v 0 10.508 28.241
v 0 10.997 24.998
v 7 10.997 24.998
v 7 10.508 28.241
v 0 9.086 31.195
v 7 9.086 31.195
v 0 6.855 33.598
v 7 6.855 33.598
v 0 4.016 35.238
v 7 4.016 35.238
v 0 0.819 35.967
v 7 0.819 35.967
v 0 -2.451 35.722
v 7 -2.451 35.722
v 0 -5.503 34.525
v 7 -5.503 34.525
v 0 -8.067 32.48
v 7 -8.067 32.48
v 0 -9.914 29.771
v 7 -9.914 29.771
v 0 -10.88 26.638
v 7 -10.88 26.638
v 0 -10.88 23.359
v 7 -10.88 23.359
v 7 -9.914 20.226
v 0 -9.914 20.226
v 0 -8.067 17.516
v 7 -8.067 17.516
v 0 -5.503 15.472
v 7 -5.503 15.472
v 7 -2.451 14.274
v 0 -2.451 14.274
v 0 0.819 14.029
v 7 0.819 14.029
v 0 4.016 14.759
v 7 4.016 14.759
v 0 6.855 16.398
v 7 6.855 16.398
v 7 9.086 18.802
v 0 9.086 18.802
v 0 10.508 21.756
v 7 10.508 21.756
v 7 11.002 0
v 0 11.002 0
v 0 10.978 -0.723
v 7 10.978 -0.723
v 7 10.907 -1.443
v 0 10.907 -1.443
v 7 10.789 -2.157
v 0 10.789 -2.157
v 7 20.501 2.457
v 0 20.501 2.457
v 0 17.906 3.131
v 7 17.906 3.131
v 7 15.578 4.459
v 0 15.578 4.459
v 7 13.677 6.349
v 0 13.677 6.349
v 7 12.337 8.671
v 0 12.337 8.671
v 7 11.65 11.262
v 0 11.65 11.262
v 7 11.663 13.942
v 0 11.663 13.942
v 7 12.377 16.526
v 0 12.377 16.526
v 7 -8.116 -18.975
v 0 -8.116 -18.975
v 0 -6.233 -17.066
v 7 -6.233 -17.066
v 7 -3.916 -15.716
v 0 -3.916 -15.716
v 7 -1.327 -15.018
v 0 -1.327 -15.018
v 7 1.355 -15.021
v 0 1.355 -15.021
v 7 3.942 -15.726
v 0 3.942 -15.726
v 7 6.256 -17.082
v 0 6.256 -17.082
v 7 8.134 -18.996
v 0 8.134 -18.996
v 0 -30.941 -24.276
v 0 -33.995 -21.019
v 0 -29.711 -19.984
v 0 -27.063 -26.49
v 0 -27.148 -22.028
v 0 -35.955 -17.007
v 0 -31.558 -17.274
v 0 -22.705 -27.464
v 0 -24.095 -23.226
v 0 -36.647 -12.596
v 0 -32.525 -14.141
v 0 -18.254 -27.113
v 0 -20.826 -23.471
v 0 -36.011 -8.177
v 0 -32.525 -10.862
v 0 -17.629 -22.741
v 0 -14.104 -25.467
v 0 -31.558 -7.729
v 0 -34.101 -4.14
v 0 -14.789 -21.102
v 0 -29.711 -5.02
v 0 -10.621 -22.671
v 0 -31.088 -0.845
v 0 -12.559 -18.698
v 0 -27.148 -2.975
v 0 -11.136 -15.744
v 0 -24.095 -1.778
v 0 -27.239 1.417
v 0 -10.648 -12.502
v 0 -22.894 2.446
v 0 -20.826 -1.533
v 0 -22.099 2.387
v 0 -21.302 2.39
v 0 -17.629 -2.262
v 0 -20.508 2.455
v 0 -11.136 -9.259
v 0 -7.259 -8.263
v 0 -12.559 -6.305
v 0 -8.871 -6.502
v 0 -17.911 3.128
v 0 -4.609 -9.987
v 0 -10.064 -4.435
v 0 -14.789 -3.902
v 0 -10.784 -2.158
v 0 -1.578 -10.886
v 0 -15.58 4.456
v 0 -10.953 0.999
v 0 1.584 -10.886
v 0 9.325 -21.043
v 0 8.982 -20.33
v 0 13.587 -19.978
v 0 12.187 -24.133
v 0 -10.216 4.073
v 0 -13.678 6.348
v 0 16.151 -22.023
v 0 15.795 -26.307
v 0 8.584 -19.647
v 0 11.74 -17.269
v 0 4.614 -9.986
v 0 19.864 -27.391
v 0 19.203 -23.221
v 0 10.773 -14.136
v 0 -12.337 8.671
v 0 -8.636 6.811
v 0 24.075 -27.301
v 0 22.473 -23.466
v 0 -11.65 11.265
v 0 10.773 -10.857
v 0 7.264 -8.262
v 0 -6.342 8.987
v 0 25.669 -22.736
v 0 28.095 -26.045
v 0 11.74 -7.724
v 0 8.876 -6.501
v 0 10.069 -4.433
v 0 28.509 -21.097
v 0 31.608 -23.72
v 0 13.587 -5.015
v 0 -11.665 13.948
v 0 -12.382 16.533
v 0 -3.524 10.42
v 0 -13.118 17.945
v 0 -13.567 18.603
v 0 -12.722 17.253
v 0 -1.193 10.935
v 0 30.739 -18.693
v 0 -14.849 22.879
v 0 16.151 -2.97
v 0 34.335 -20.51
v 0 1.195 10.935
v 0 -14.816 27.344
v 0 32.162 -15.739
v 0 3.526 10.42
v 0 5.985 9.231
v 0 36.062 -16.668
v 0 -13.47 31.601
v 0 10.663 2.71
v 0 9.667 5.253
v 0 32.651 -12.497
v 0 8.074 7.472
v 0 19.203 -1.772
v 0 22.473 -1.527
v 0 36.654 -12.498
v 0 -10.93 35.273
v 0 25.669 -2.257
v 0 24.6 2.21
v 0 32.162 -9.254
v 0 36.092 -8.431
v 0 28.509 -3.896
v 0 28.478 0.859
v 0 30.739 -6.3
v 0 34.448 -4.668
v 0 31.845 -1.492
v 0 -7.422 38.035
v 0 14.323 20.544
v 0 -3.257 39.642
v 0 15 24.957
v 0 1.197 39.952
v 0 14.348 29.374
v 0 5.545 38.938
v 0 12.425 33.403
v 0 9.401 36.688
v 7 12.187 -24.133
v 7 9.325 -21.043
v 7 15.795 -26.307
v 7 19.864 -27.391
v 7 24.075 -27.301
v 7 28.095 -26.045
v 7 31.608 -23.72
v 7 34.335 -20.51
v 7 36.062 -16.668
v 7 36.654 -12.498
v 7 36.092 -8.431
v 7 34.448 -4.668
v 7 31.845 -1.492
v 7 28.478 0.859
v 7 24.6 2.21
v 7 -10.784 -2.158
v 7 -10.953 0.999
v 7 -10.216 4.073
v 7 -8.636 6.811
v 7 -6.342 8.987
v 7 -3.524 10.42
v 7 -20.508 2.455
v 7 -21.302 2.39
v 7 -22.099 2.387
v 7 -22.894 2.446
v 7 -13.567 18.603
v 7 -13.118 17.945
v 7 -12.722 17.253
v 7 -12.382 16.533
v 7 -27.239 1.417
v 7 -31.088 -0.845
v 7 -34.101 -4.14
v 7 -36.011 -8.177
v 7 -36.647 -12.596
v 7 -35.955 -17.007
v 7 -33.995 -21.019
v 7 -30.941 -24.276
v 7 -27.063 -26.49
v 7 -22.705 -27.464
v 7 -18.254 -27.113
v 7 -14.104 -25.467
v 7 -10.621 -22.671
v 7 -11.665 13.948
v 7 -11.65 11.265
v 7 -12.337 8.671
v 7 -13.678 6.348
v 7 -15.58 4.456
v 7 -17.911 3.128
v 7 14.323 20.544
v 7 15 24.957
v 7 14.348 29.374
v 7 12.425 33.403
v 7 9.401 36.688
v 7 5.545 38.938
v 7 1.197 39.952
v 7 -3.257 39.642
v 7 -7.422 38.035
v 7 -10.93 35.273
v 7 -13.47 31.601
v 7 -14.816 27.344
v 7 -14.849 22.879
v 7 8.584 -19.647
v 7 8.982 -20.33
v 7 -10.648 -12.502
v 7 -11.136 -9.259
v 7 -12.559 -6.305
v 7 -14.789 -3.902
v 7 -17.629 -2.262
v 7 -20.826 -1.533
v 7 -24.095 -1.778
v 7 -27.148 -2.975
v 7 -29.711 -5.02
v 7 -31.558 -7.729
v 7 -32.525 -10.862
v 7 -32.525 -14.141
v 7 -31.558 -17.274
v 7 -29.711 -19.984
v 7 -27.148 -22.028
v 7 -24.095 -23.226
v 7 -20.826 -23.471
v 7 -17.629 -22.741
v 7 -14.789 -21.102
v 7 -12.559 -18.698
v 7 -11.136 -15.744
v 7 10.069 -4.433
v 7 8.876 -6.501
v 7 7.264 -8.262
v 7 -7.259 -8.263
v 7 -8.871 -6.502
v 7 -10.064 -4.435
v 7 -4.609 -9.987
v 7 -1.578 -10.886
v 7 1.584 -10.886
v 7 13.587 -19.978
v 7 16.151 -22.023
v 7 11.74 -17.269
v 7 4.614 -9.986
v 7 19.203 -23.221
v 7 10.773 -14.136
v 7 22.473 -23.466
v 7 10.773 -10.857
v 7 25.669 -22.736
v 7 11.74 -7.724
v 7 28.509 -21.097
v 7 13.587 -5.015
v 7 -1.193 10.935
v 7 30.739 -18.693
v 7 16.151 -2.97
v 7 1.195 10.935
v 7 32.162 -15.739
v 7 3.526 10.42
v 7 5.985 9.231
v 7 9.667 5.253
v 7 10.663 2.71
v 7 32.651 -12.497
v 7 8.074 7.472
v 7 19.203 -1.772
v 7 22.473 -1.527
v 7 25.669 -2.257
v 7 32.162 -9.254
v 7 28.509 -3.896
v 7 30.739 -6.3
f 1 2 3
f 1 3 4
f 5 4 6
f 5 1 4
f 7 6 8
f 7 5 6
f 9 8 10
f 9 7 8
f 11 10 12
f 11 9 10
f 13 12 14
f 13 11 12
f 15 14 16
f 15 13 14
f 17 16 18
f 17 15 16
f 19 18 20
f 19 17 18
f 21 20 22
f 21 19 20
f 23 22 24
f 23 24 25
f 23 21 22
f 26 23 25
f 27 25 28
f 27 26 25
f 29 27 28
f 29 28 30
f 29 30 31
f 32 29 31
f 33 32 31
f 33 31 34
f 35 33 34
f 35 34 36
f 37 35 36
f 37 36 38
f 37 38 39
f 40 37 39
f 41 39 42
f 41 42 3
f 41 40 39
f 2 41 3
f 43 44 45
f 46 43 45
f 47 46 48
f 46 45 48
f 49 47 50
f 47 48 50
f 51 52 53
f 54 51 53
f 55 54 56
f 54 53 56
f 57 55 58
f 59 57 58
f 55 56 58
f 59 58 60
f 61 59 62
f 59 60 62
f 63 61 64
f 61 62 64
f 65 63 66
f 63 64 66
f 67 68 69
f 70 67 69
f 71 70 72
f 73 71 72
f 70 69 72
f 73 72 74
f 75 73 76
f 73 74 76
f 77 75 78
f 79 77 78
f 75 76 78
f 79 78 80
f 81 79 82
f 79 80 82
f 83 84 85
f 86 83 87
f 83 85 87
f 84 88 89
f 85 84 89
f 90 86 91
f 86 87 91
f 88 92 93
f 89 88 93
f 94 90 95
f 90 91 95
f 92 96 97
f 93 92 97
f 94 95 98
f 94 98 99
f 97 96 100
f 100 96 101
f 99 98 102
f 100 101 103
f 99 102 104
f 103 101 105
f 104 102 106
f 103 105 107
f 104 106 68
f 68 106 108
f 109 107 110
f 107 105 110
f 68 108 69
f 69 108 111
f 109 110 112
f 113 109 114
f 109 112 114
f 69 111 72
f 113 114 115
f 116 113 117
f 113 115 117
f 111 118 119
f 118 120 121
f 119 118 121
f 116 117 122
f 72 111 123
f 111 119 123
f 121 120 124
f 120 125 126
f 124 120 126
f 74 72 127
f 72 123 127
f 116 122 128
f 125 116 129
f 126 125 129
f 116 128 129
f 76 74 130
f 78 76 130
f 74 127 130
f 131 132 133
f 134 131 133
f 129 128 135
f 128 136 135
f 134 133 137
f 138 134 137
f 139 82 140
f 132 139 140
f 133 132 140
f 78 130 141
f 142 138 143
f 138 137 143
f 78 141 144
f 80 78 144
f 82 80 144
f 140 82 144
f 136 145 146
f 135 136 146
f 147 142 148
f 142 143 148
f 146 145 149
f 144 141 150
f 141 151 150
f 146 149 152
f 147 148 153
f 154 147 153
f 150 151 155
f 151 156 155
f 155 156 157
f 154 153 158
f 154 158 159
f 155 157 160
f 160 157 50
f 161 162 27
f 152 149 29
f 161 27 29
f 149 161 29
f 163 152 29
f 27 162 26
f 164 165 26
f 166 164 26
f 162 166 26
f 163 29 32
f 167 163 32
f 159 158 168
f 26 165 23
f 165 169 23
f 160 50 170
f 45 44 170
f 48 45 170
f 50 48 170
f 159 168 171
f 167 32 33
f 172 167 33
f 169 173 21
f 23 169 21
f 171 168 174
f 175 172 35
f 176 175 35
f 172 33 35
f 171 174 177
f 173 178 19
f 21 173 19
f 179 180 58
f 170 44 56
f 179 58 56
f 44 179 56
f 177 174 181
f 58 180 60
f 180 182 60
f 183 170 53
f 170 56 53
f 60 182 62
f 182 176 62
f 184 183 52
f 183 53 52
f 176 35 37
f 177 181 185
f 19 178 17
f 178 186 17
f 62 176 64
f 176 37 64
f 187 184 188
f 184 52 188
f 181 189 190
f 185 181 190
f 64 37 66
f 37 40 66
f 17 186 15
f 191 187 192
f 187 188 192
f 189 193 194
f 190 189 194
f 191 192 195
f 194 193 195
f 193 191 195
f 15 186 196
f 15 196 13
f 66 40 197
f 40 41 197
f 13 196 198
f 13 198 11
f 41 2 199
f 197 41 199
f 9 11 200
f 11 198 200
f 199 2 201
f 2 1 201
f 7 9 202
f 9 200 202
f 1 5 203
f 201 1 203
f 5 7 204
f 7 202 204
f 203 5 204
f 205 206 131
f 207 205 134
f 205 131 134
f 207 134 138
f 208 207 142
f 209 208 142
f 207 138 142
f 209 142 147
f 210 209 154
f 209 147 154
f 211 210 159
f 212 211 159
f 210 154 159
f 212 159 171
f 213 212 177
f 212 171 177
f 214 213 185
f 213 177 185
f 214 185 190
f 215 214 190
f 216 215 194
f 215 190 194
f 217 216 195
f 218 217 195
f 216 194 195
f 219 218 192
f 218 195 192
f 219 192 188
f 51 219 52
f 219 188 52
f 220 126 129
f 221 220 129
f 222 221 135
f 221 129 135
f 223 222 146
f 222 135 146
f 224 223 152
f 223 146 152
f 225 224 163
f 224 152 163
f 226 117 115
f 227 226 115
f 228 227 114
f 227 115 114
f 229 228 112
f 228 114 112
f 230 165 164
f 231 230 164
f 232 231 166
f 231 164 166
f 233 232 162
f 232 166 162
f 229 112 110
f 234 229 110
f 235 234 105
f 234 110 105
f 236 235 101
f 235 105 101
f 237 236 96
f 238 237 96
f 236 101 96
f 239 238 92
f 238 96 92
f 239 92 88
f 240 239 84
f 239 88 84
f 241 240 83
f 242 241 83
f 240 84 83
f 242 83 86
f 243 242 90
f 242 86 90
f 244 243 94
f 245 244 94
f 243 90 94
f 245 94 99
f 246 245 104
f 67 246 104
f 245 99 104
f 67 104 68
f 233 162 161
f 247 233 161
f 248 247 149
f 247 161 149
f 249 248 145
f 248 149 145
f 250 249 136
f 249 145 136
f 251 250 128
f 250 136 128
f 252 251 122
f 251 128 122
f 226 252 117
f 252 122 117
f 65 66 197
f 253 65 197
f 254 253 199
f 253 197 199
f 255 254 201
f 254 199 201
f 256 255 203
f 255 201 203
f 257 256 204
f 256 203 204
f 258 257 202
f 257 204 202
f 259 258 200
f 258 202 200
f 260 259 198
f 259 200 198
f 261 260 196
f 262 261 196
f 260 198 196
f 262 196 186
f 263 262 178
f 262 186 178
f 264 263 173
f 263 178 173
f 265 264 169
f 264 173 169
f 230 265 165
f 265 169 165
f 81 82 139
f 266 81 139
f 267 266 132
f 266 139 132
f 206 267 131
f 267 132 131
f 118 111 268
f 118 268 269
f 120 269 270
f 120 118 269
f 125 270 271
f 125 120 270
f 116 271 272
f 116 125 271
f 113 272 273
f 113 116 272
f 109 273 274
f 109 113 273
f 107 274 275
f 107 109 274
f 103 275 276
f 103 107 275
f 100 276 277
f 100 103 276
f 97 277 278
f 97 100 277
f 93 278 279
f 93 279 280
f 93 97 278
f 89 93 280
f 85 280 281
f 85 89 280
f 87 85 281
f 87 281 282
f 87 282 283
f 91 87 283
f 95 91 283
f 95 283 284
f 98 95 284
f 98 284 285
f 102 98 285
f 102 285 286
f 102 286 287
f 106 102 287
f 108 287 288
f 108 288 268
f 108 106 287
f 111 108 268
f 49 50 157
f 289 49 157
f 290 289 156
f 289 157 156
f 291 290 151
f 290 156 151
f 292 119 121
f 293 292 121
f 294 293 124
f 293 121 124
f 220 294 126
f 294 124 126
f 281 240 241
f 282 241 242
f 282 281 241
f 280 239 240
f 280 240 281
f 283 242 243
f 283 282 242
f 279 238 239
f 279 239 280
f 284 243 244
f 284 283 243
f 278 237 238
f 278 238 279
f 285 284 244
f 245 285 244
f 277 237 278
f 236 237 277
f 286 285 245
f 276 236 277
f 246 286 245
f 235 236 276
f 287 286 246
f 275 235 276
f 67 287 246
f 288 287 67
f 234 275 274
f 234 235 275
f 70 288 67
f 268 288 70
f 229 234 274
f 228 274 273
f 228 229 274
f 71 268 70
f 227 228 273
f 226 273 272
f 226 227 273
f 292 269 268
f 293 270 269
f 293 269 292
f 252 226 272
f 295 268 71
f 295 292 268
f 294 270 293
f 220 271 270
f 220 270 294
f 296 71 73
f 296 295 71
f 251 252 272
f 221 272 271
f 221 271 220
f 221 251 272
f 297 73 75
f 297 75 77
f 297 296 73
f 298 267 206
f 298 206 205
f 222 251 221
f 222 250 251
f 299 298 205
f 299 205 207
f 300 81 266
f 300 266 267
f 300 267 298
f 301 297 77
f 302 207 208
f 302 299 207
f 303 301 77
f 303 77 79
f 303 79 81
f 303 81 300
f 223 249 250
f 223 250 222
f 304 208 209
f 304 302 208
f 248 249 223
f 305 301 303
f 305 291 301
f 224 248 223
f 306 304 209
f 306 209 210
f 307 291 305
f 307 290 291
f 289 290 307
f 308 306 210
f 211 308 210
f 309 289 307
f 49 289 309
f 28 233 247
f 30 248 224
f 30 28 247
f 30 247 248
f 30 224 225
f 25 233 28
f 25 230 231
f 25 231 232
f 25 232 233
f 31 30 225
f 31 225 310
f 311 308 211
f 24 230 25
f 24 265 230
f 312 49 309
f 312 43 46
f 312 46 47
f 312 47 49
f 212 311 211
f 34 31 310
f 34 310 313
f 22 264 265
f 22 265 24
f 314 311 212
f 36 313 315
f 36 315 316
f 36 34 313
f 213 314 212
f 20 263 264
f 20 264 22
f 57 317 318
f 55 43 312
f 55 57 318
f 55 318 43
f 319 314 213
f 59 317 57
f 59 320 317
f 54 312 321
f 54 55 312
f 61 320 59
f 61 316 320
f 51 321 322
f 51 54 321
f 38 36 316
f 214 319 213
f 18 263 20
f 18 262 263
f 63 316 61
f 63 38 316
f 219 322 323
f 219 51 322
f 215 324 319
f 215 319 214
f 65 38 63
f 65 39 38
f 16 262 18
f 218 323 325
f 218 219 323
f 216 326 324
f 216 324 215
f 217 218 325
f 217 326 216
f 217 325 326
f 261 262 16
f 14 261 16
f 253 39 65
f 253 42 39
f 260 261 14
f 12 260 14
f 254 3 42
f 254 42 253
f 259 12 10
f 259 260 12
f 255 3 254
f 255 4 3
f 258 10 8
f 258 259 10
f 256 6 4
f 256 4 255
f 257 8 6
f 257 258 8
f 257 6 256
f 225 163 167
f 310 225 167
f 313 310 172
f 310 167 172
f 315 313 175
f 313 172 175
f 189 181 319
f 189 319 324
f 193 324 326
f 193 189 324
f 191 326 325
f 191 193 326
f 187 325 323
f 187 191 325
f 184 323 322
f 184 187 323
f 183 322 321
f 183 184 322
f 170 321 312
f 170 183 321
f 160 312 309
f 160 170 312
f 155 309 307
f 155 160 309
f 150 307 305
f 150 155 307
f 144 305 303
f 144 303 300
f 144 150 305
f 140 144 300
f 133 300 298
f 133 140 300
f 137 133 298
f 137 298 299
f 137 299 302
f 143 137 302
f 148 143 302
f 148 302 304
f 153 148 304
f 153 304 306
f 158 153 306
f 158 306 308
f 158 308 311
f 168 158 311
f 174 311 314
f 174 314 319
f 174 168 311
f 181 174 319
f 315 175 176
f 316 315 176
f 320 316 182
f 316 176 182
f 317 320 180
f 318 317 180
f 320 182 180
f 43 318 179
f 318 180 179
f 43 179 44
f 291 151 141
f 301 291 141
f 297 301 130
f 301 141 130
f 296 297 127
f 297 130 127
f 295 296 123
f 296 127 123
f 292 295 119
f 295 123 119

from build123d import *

# Parameters (mm, degrees)
F0_R     = 11
F1_DEPTH = 7


with BuildPart() as f1:
    # F0 (on Right) → F1 (new body)
    with BuildSketch(Plane.YZ):
        with BuildLine():
            ThreePointArc((-10.784147298, -2.158380433), (-15.2181462376, 1.0504484301), (-20.5081756924, 2.4549118995))
            ThreePointArc((-20.5081756924, 2.4549118995), (-21.7006480739, 2.3804655364), (-22.893620827, 2.4464098455))
            ThreePointArc((-22.893620827, 2.4464098455), (-33.994808864, -21.019176627), (-8.1163913394, -18.9752512981))
            ThreePointArc((-8.1163913394, -18.9752512981), (-7.0194101473, -15.8207684356), (-6.6476058185, -12.5017487903))
            ThreePointArc((-6.6476058185, -12.5017487903), (-6.8012263567, -10.3604835388), (-7.2589414021, -8.2630772634))
            ThreePointArc((-7.2589414021, -8.2630772634), (-9.5238156568, -5.500769422), (-10.784147298, -2.158380433))
        make_face()
        with Locations((-21.6476058185, -12.5017487903)):
            Circle(F0_R, mode=Mode.SUBTRACT)
        with BuildLine():
            ThreePointArc((-3.5235349877, 10.4197153255), (-8.5198228728, 12.6544494568), (-12.381765286, 16.532893741))
            ThreePointArc((-12.381765286, 16.532893741), (-12.9305392328, 7.4652234928), (-20.5081756924, 2.4549118995))
            ThreePointArc((-20.5081756924, 2.4549118995), (-15.2181462376, 1.0504484301), (-10.784147298, -2.158380433))
            ThreePointArc((-10.784147298, -2.158380433), (-9.5247042237, 5.4992305421), (-3.5235349877, 10.4197153255))
        make_face()
        with BuildLine():
            ThreePointArc((12.3770934621, 16.5260660004), (14.3292777545, 20.564709814), (15, 25))
            ThreePointArc((15, 25), (-3.2778125884, 39.6374842318), (-13.5674592847, 18.602809323))
            ThreePointArc((-13.5674592847, 18.602809323), (-12.9137018843, 17.6027423738), (-12.381765286, 16.532893741))
            ThreePointArc((-12.381765286, 16.532893741), (-8.5198228728, 12.6544494568), (-3.5235349877, 10.4197153255))
            ThreePointArc((-3.5235349877, 10.4197153255), (0.0011309034, 11.0000000457), (3.5258904978, 10.4202847697))
            ThreePointArc((3.5258904978, 10.4202847697), (8.5174154423, 12.6527884045), (12.3770934621, 16.5260660004))
        make_face()
        with Locations((-0.0030291348, 24.9982509651)):
            Circle(F0_R, mode=Mode.SUBTRACT)
        with BuildLine():
            ThreePointArc((20.5011537716, 2.457407484), (12.9303431289, 7.4655631547), (12.3770934621, 16.5260660004))
            ThreePointArc((12.3770934621, 16.5260660004), (8.5174154423, 12.6527884045), (3.5258904978, 10.4202847697))
            ThreePointArc((3.5258904978, 10.4202847697), (8.9396528624, 6.4123872618), (11.0020194703, 8.16e-08))
            ThreePointArc((11.0020194703, 8.16e-08), (10.9485181944, -1.0835891777), (10.7885348007, -2.1566378173))
            ThreePointArc((10.7885348007, -2.1566378173), (15.2171845533, 1.0506135401), (20.5011537716, 2.457407484))
        make_face()
        with BuildLine():
            ThreePointArc((36.6536642295, -12.4982509651), (31.8446490477, -1.4917152506), (20.5011537716, 2.457407484))
            ThreePointArc((20.5011537716, 2.457407484), (15.2171845533, 1.0506135401), (10.7885348007, -2.1566378173))
            ThreePointArc((10.7885348007, -2.1566378173), (9.5287431643, -5.4992303789), (7.2643152111, -8.261904092))
            ThreePointArc((7.2643152111, -8.261904092), (6.7026707945, -13.7097769898), (8.1341442138, -18.9961412801))
            ThreePointArc((8.1341442138, -18.9961412801), (8.7894001381, -19.9846100473), (9.3251094568, -21.0426489671))
            ThreePointArc((9.3251094568, -21.0426489671), (26.1298053359, -26.8148204143), (36.6536642295, -12.4982509651))
        make_face()
        with Locations((21.6506349533, -12.4965021748)):
            Circle(F0_R, mode=Mode.SUBTRACT)
        with BuildLine():
            ThreePointArc((8.1341442138, -18.9961412801), (6.7026707945, -13.7097769898), (7.2643152111, -8.261904092))
            ThreePointArc((7.2643152111, -8.261904092), (0.0029080373, -10.9999998825), (-7.2589414021, -8.2630772634))
            ThreePointArc((-7.2589414021, -8.2630772634), (-6.8012263567, -10.3604835388), (-6.6476058185, -12.5017487903))
            ThreePointArc((-6.6476058185, -12.5017487903), (-7.0194101473, -15.8207684356), (-8.1163913394, -18.9752512981))
            ThreePointArc((-8.1163913394, -18.9752512981), (0.0140889918, -14.9307955749), (8.1341442138, -18.9961412801))
        make_face()
    extrude(amount=F1_DEPTH)


solid = f1.part
